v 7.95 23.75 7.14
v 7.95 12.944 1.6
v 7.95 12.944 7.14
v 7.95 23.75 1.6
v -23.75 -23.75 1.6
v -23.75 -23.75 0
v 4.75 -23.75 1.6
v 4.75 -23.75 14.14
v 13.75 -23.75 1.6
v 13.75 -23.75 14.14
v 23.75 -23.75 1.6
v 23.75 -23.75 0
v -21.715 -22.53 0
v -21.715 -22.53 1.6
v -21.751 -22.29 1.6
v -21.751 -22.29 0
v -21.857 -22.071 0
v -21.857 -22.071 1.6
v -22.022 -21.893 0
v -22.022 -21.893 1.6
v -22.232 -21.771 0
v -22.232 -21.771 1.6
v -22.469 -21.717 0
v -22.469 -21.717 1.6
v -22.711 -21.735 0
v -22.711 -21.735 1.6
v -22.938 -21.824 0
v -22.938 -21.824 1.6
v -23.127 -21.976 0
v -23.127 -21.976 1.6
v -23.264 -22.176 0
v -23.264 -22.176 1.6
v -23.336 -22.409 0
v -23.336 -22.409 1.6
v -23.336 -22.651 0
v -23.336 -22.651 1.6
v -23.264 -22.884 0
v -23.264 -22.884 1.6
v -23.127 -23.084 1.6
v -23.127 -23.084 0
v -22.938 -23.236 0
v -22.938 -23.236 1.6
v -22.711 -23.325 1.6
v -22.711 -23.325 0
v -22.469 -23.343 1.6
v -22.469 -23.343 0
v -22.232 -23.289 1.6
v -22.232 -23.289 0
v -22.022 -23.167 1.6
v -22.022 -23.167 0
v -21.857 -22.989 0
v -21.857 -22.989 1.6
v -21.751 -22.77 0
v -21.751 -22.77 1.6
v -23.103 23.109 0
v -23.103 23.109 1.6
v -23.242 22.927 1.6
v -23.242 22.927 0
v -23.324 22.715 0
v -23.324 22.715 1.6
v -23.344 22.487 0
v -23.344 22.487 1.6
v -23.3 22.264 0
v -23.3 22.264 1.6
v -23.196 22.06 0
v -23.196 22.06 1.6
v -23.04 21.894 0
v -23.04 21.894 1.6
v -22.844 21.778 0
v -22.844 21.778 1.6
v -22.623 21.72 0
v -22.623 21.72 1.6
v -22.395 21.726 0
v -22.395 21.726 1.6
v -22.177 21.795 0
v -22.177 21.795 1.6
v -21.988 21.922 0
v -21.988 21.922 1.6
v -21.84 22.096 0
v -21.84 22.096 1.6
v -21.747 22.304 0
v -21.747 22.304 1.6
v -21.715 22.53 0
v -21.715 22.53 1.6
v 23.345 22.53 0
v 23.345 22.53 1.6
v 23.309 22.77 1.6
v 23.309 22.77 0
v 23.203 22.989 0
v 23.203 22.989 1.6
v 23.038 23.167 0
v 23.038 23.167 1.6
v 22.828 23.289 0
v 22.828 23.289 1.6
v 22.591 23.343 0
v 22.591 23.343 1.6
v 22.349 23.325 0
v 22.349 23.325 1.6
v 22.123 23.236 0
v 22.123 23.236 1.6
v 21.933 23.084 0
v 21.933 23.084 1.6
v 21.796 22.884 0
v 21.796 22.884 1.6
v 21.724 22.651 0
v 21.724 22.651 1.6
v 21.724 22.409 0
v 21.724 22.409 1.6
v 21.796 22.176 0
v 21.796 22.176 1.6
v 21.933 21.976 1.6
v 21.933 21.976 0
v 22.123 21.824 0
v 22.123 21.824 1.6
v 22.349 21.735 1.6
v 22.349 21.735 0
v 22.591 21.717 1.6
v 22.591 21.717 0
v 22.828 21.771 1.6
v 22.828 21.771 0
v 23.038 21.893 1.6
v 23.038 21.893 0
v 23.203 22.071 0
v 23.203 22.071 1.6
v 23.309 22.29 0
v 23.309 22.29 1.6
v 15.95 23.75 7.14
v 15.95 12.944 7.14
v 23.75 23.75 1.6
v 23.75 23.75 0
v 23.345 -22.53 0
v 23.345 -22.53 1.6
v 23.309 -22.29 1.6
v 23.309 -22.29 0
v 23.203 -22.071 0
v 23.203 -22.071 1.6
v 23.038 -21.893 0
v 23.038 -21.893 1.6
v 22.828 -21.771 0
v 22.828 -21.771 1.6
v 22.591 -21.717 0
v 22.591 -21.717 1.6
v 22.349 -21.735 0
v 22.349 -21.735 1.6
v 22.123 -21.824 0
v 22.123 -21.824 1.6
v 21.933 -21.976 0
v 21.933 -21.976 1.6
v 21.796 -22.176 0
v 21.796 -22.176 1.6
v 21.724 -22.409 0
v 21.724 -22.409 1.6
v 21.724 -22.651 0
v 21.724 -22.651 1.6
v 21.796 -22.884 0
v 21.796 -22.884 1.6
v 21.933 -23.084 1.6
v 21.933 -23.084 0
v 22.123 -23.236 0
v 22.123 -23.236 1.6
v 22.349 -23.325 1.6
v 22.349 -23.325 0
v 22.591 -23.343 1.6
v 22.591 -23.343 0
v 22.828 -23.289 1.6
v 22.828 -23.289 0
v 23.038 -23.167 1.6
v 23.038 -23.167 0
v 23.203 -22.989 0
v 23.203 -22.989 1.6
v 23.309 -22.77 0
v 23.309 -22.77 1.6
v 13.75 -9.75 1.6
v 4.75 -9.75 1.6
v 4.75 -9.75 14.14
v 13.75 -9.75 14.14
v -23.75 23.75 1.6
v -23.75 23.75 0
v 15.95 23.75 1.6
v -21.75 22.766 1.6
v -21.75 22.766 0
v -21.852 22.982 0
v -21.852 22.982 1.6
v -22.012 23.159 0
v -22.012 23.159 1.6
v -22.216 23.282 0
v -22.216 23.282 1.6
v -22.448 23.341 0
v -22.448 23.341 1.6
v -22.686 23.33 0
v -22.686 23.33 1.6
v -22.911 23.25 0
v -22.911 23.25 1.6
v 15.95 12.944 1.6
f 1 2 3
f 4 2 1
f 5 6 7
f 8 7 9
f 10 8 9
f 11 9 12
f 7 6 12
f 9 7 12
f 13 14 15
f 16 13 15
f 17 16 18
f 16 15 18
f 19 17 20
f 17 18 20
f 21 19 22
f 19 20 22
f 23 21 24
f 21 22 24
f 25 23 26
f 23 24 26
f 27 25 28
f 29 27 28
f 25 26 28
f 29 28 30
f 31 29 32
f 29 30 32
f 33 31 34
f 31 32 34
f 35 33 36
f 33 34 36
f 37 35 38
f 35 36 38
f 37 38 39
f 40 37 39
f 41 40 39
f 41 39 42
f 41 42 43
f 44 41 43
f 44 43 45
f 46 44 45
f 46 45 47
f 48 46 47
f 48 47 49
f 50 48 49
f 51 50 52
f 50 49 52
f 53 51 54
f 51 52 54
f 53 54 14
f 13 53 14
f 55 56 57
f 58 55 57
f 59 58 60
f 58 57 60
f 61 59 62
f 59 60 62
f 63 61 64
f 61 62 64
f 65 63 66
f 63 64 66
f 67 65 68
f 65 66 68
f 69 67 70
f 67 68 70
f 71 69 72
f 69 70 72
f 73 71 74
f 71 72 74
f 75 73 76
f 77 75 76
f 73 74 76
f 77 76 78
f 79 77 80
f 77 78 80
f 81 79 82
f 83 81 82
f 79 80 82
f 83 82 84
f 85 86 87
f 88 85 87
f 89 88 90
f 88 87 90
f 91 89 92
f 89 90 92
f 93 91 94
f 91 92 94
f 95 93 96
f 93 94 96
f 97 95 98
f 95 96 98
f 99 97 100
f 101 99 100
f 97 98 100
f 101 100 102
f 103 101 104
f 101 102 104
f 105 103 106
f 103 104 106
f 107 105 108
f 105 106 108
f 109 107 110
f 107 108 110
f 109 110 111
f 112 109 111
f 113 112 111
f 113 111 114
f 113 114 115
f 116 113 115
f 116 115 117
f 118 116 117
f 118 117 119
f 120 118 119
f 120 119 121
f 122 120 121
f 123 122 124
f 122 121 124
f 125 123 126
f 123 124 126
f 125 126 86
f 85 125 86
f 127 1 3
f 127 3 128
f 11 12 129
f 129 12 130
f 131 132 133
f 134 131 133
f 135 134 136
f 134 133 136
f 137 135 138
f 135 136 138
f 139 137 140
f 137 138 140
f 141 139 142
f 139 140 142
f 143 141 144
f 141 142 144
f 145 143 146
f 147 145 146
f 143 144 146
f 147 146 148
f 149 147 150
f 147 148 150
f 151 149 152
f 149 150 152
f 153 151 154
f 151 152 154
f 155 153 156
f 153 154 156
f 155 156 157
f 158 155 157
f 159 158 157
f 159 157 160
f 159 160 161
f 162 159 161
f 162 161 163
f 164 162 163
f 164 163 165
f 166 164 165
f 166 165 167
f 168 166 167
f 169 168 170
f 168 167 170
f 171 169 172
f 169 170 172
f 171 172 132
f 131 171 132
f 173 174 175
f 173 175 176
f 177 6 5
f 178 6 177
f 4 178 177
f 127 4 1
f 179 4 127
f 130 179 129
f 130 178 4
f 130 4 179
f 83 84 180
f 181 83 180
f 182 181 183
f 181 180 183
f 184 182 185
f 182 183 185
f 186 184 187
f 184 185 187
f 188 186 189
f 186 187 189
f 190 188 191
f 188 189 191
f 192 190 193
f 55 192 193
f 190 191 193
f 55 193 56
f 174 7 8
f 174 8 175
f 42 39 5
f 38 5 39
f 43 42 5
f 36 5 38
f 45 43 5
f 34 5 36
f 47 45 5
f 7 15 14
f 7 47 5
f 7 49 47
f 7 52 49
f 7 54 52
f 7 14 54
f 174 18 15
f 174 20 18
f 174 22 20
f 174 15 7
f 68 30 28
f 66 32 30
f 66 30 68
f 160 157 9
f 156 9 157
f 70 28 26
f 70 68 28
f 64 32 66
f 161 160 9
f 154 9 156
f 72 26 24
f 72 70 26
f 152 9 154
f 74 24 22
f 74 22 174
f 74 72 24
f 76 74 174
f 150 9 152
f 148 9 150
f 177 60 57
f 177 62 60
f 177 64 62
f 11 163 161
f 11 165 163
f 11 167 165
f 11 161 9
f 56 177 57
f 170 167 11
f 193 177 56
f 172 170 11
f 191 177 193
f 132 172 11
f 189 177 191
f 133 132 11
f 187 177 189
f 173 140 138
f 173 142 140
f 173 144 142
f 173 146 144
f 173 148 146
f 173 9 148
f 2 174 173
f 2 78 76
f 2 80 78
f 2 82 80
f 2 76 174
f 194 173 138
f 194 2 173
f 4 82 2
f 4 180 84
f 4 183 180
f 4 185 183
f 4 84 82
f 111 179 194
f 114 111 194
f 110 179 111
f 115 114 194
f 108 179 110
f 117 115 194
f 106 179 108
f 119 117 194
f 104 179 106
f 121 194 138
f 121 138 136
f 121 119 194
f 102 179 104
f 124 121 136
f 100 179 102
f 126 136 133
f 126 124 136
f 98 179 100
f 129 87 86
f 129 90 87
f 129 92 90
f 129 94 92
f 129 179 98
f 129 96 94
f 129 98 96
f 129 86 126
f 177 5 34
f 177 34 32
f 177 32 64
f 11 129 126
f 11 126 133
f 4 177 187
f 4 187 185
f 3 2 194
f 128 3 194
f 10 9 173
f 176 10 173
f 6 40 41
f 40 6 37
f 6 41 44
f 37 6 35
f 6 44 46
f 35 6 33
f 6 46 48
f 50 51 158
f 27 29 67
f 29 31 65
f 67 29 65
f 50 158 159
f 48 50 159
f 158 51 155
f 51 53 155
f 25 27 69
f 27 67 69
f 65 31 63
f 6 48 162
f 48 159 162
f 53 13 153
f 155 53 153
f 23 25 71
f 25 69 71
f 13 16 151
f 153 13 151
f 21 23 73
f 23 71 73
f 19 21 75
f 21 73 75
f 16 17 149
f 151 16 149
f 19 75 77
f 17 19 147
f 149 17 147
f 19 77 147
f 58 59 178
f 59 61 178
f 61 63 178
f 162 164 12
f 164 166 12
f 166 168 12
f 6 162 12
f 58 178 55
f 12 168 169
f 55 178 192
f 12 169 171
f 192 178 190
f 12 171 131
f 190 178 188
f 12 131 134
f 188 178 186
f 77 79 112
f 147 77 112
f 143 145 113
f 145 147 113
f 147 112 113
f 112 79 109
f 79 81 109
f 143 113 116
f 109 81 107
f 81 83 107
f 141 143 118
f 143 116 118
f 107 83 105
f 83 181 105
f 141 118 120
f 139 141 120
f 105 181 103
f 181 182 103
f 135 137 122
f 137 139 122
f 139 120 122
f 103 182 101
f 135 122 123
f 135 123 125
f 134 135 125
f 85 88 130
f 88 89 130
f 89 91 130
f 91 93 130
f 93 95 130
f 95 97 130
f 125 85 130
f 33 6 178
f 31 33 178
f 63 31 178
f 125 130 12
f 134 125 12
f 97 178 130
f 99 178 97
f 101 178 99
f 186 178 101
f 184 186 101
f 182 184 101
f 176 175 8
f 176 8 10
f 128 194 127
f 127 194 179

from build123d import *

# Parameters (mm, degrees)
F0_W     = 47.5
F0_H     = 47.5
F1_DEPTH = 1.6
F2_W     = 9
F2_H     = 14
F3_DEPTH = 12.54
F2_W_2   = 8
F2_H_2   = 10.806212
F4_DEPTH = 5.54
F2_R     = 0.815
F5_DEPTH = 1.6


with BuildPart() as f1:
    # F0 (on Top) → F1 (new body)
    with BuildSketch(Plane.XY):
        Rectangle(F0_W, F0_H)
    extrude(amount=F1_DEPTH)

    # F2 (on face) → F3 (join)
    with BuildSketch(Plane.XY.offset(1.6)):
        with Locations((9.25, -16.75)):
            Rectangle(F2_W, F2_H)
    extrude(amount=F3_DEPTH)

    # F2 (on face) → F4 (join)
    with BuildSketch(Plane.XY.offset(1.6)):
        with Locations((11.95, 18.346894)):
            Rectangle(F2_W_2, F2_H_2)
    extrude(amount=F4_DEPTH)

    # F2 (on face) → F5 (cut)
    with BuildSketch(Plane.XY.offset(1.6)):
        with Locations((-22.53, -22.53)):
            Circle(F2_R)
        with Locations((22.53, -22.53)):
            Circle(F2_R)
        with Locations((22.53, 22.53)):
            Circle(F2_R)
        with BuildLine():
            ThreePointArc((-21.715, 22.53), (-22.216277, 23.282199), (-23.103473, 23.109097))
            ThreePointArc((-23.103473, 23.109097), (-22.843723, 21.777801), (-21.715, 22.53))
        make_face()
    extrude(amount=-F5_DEPTH, mode=Mode.SUBTRACT)


solid = f1.part
